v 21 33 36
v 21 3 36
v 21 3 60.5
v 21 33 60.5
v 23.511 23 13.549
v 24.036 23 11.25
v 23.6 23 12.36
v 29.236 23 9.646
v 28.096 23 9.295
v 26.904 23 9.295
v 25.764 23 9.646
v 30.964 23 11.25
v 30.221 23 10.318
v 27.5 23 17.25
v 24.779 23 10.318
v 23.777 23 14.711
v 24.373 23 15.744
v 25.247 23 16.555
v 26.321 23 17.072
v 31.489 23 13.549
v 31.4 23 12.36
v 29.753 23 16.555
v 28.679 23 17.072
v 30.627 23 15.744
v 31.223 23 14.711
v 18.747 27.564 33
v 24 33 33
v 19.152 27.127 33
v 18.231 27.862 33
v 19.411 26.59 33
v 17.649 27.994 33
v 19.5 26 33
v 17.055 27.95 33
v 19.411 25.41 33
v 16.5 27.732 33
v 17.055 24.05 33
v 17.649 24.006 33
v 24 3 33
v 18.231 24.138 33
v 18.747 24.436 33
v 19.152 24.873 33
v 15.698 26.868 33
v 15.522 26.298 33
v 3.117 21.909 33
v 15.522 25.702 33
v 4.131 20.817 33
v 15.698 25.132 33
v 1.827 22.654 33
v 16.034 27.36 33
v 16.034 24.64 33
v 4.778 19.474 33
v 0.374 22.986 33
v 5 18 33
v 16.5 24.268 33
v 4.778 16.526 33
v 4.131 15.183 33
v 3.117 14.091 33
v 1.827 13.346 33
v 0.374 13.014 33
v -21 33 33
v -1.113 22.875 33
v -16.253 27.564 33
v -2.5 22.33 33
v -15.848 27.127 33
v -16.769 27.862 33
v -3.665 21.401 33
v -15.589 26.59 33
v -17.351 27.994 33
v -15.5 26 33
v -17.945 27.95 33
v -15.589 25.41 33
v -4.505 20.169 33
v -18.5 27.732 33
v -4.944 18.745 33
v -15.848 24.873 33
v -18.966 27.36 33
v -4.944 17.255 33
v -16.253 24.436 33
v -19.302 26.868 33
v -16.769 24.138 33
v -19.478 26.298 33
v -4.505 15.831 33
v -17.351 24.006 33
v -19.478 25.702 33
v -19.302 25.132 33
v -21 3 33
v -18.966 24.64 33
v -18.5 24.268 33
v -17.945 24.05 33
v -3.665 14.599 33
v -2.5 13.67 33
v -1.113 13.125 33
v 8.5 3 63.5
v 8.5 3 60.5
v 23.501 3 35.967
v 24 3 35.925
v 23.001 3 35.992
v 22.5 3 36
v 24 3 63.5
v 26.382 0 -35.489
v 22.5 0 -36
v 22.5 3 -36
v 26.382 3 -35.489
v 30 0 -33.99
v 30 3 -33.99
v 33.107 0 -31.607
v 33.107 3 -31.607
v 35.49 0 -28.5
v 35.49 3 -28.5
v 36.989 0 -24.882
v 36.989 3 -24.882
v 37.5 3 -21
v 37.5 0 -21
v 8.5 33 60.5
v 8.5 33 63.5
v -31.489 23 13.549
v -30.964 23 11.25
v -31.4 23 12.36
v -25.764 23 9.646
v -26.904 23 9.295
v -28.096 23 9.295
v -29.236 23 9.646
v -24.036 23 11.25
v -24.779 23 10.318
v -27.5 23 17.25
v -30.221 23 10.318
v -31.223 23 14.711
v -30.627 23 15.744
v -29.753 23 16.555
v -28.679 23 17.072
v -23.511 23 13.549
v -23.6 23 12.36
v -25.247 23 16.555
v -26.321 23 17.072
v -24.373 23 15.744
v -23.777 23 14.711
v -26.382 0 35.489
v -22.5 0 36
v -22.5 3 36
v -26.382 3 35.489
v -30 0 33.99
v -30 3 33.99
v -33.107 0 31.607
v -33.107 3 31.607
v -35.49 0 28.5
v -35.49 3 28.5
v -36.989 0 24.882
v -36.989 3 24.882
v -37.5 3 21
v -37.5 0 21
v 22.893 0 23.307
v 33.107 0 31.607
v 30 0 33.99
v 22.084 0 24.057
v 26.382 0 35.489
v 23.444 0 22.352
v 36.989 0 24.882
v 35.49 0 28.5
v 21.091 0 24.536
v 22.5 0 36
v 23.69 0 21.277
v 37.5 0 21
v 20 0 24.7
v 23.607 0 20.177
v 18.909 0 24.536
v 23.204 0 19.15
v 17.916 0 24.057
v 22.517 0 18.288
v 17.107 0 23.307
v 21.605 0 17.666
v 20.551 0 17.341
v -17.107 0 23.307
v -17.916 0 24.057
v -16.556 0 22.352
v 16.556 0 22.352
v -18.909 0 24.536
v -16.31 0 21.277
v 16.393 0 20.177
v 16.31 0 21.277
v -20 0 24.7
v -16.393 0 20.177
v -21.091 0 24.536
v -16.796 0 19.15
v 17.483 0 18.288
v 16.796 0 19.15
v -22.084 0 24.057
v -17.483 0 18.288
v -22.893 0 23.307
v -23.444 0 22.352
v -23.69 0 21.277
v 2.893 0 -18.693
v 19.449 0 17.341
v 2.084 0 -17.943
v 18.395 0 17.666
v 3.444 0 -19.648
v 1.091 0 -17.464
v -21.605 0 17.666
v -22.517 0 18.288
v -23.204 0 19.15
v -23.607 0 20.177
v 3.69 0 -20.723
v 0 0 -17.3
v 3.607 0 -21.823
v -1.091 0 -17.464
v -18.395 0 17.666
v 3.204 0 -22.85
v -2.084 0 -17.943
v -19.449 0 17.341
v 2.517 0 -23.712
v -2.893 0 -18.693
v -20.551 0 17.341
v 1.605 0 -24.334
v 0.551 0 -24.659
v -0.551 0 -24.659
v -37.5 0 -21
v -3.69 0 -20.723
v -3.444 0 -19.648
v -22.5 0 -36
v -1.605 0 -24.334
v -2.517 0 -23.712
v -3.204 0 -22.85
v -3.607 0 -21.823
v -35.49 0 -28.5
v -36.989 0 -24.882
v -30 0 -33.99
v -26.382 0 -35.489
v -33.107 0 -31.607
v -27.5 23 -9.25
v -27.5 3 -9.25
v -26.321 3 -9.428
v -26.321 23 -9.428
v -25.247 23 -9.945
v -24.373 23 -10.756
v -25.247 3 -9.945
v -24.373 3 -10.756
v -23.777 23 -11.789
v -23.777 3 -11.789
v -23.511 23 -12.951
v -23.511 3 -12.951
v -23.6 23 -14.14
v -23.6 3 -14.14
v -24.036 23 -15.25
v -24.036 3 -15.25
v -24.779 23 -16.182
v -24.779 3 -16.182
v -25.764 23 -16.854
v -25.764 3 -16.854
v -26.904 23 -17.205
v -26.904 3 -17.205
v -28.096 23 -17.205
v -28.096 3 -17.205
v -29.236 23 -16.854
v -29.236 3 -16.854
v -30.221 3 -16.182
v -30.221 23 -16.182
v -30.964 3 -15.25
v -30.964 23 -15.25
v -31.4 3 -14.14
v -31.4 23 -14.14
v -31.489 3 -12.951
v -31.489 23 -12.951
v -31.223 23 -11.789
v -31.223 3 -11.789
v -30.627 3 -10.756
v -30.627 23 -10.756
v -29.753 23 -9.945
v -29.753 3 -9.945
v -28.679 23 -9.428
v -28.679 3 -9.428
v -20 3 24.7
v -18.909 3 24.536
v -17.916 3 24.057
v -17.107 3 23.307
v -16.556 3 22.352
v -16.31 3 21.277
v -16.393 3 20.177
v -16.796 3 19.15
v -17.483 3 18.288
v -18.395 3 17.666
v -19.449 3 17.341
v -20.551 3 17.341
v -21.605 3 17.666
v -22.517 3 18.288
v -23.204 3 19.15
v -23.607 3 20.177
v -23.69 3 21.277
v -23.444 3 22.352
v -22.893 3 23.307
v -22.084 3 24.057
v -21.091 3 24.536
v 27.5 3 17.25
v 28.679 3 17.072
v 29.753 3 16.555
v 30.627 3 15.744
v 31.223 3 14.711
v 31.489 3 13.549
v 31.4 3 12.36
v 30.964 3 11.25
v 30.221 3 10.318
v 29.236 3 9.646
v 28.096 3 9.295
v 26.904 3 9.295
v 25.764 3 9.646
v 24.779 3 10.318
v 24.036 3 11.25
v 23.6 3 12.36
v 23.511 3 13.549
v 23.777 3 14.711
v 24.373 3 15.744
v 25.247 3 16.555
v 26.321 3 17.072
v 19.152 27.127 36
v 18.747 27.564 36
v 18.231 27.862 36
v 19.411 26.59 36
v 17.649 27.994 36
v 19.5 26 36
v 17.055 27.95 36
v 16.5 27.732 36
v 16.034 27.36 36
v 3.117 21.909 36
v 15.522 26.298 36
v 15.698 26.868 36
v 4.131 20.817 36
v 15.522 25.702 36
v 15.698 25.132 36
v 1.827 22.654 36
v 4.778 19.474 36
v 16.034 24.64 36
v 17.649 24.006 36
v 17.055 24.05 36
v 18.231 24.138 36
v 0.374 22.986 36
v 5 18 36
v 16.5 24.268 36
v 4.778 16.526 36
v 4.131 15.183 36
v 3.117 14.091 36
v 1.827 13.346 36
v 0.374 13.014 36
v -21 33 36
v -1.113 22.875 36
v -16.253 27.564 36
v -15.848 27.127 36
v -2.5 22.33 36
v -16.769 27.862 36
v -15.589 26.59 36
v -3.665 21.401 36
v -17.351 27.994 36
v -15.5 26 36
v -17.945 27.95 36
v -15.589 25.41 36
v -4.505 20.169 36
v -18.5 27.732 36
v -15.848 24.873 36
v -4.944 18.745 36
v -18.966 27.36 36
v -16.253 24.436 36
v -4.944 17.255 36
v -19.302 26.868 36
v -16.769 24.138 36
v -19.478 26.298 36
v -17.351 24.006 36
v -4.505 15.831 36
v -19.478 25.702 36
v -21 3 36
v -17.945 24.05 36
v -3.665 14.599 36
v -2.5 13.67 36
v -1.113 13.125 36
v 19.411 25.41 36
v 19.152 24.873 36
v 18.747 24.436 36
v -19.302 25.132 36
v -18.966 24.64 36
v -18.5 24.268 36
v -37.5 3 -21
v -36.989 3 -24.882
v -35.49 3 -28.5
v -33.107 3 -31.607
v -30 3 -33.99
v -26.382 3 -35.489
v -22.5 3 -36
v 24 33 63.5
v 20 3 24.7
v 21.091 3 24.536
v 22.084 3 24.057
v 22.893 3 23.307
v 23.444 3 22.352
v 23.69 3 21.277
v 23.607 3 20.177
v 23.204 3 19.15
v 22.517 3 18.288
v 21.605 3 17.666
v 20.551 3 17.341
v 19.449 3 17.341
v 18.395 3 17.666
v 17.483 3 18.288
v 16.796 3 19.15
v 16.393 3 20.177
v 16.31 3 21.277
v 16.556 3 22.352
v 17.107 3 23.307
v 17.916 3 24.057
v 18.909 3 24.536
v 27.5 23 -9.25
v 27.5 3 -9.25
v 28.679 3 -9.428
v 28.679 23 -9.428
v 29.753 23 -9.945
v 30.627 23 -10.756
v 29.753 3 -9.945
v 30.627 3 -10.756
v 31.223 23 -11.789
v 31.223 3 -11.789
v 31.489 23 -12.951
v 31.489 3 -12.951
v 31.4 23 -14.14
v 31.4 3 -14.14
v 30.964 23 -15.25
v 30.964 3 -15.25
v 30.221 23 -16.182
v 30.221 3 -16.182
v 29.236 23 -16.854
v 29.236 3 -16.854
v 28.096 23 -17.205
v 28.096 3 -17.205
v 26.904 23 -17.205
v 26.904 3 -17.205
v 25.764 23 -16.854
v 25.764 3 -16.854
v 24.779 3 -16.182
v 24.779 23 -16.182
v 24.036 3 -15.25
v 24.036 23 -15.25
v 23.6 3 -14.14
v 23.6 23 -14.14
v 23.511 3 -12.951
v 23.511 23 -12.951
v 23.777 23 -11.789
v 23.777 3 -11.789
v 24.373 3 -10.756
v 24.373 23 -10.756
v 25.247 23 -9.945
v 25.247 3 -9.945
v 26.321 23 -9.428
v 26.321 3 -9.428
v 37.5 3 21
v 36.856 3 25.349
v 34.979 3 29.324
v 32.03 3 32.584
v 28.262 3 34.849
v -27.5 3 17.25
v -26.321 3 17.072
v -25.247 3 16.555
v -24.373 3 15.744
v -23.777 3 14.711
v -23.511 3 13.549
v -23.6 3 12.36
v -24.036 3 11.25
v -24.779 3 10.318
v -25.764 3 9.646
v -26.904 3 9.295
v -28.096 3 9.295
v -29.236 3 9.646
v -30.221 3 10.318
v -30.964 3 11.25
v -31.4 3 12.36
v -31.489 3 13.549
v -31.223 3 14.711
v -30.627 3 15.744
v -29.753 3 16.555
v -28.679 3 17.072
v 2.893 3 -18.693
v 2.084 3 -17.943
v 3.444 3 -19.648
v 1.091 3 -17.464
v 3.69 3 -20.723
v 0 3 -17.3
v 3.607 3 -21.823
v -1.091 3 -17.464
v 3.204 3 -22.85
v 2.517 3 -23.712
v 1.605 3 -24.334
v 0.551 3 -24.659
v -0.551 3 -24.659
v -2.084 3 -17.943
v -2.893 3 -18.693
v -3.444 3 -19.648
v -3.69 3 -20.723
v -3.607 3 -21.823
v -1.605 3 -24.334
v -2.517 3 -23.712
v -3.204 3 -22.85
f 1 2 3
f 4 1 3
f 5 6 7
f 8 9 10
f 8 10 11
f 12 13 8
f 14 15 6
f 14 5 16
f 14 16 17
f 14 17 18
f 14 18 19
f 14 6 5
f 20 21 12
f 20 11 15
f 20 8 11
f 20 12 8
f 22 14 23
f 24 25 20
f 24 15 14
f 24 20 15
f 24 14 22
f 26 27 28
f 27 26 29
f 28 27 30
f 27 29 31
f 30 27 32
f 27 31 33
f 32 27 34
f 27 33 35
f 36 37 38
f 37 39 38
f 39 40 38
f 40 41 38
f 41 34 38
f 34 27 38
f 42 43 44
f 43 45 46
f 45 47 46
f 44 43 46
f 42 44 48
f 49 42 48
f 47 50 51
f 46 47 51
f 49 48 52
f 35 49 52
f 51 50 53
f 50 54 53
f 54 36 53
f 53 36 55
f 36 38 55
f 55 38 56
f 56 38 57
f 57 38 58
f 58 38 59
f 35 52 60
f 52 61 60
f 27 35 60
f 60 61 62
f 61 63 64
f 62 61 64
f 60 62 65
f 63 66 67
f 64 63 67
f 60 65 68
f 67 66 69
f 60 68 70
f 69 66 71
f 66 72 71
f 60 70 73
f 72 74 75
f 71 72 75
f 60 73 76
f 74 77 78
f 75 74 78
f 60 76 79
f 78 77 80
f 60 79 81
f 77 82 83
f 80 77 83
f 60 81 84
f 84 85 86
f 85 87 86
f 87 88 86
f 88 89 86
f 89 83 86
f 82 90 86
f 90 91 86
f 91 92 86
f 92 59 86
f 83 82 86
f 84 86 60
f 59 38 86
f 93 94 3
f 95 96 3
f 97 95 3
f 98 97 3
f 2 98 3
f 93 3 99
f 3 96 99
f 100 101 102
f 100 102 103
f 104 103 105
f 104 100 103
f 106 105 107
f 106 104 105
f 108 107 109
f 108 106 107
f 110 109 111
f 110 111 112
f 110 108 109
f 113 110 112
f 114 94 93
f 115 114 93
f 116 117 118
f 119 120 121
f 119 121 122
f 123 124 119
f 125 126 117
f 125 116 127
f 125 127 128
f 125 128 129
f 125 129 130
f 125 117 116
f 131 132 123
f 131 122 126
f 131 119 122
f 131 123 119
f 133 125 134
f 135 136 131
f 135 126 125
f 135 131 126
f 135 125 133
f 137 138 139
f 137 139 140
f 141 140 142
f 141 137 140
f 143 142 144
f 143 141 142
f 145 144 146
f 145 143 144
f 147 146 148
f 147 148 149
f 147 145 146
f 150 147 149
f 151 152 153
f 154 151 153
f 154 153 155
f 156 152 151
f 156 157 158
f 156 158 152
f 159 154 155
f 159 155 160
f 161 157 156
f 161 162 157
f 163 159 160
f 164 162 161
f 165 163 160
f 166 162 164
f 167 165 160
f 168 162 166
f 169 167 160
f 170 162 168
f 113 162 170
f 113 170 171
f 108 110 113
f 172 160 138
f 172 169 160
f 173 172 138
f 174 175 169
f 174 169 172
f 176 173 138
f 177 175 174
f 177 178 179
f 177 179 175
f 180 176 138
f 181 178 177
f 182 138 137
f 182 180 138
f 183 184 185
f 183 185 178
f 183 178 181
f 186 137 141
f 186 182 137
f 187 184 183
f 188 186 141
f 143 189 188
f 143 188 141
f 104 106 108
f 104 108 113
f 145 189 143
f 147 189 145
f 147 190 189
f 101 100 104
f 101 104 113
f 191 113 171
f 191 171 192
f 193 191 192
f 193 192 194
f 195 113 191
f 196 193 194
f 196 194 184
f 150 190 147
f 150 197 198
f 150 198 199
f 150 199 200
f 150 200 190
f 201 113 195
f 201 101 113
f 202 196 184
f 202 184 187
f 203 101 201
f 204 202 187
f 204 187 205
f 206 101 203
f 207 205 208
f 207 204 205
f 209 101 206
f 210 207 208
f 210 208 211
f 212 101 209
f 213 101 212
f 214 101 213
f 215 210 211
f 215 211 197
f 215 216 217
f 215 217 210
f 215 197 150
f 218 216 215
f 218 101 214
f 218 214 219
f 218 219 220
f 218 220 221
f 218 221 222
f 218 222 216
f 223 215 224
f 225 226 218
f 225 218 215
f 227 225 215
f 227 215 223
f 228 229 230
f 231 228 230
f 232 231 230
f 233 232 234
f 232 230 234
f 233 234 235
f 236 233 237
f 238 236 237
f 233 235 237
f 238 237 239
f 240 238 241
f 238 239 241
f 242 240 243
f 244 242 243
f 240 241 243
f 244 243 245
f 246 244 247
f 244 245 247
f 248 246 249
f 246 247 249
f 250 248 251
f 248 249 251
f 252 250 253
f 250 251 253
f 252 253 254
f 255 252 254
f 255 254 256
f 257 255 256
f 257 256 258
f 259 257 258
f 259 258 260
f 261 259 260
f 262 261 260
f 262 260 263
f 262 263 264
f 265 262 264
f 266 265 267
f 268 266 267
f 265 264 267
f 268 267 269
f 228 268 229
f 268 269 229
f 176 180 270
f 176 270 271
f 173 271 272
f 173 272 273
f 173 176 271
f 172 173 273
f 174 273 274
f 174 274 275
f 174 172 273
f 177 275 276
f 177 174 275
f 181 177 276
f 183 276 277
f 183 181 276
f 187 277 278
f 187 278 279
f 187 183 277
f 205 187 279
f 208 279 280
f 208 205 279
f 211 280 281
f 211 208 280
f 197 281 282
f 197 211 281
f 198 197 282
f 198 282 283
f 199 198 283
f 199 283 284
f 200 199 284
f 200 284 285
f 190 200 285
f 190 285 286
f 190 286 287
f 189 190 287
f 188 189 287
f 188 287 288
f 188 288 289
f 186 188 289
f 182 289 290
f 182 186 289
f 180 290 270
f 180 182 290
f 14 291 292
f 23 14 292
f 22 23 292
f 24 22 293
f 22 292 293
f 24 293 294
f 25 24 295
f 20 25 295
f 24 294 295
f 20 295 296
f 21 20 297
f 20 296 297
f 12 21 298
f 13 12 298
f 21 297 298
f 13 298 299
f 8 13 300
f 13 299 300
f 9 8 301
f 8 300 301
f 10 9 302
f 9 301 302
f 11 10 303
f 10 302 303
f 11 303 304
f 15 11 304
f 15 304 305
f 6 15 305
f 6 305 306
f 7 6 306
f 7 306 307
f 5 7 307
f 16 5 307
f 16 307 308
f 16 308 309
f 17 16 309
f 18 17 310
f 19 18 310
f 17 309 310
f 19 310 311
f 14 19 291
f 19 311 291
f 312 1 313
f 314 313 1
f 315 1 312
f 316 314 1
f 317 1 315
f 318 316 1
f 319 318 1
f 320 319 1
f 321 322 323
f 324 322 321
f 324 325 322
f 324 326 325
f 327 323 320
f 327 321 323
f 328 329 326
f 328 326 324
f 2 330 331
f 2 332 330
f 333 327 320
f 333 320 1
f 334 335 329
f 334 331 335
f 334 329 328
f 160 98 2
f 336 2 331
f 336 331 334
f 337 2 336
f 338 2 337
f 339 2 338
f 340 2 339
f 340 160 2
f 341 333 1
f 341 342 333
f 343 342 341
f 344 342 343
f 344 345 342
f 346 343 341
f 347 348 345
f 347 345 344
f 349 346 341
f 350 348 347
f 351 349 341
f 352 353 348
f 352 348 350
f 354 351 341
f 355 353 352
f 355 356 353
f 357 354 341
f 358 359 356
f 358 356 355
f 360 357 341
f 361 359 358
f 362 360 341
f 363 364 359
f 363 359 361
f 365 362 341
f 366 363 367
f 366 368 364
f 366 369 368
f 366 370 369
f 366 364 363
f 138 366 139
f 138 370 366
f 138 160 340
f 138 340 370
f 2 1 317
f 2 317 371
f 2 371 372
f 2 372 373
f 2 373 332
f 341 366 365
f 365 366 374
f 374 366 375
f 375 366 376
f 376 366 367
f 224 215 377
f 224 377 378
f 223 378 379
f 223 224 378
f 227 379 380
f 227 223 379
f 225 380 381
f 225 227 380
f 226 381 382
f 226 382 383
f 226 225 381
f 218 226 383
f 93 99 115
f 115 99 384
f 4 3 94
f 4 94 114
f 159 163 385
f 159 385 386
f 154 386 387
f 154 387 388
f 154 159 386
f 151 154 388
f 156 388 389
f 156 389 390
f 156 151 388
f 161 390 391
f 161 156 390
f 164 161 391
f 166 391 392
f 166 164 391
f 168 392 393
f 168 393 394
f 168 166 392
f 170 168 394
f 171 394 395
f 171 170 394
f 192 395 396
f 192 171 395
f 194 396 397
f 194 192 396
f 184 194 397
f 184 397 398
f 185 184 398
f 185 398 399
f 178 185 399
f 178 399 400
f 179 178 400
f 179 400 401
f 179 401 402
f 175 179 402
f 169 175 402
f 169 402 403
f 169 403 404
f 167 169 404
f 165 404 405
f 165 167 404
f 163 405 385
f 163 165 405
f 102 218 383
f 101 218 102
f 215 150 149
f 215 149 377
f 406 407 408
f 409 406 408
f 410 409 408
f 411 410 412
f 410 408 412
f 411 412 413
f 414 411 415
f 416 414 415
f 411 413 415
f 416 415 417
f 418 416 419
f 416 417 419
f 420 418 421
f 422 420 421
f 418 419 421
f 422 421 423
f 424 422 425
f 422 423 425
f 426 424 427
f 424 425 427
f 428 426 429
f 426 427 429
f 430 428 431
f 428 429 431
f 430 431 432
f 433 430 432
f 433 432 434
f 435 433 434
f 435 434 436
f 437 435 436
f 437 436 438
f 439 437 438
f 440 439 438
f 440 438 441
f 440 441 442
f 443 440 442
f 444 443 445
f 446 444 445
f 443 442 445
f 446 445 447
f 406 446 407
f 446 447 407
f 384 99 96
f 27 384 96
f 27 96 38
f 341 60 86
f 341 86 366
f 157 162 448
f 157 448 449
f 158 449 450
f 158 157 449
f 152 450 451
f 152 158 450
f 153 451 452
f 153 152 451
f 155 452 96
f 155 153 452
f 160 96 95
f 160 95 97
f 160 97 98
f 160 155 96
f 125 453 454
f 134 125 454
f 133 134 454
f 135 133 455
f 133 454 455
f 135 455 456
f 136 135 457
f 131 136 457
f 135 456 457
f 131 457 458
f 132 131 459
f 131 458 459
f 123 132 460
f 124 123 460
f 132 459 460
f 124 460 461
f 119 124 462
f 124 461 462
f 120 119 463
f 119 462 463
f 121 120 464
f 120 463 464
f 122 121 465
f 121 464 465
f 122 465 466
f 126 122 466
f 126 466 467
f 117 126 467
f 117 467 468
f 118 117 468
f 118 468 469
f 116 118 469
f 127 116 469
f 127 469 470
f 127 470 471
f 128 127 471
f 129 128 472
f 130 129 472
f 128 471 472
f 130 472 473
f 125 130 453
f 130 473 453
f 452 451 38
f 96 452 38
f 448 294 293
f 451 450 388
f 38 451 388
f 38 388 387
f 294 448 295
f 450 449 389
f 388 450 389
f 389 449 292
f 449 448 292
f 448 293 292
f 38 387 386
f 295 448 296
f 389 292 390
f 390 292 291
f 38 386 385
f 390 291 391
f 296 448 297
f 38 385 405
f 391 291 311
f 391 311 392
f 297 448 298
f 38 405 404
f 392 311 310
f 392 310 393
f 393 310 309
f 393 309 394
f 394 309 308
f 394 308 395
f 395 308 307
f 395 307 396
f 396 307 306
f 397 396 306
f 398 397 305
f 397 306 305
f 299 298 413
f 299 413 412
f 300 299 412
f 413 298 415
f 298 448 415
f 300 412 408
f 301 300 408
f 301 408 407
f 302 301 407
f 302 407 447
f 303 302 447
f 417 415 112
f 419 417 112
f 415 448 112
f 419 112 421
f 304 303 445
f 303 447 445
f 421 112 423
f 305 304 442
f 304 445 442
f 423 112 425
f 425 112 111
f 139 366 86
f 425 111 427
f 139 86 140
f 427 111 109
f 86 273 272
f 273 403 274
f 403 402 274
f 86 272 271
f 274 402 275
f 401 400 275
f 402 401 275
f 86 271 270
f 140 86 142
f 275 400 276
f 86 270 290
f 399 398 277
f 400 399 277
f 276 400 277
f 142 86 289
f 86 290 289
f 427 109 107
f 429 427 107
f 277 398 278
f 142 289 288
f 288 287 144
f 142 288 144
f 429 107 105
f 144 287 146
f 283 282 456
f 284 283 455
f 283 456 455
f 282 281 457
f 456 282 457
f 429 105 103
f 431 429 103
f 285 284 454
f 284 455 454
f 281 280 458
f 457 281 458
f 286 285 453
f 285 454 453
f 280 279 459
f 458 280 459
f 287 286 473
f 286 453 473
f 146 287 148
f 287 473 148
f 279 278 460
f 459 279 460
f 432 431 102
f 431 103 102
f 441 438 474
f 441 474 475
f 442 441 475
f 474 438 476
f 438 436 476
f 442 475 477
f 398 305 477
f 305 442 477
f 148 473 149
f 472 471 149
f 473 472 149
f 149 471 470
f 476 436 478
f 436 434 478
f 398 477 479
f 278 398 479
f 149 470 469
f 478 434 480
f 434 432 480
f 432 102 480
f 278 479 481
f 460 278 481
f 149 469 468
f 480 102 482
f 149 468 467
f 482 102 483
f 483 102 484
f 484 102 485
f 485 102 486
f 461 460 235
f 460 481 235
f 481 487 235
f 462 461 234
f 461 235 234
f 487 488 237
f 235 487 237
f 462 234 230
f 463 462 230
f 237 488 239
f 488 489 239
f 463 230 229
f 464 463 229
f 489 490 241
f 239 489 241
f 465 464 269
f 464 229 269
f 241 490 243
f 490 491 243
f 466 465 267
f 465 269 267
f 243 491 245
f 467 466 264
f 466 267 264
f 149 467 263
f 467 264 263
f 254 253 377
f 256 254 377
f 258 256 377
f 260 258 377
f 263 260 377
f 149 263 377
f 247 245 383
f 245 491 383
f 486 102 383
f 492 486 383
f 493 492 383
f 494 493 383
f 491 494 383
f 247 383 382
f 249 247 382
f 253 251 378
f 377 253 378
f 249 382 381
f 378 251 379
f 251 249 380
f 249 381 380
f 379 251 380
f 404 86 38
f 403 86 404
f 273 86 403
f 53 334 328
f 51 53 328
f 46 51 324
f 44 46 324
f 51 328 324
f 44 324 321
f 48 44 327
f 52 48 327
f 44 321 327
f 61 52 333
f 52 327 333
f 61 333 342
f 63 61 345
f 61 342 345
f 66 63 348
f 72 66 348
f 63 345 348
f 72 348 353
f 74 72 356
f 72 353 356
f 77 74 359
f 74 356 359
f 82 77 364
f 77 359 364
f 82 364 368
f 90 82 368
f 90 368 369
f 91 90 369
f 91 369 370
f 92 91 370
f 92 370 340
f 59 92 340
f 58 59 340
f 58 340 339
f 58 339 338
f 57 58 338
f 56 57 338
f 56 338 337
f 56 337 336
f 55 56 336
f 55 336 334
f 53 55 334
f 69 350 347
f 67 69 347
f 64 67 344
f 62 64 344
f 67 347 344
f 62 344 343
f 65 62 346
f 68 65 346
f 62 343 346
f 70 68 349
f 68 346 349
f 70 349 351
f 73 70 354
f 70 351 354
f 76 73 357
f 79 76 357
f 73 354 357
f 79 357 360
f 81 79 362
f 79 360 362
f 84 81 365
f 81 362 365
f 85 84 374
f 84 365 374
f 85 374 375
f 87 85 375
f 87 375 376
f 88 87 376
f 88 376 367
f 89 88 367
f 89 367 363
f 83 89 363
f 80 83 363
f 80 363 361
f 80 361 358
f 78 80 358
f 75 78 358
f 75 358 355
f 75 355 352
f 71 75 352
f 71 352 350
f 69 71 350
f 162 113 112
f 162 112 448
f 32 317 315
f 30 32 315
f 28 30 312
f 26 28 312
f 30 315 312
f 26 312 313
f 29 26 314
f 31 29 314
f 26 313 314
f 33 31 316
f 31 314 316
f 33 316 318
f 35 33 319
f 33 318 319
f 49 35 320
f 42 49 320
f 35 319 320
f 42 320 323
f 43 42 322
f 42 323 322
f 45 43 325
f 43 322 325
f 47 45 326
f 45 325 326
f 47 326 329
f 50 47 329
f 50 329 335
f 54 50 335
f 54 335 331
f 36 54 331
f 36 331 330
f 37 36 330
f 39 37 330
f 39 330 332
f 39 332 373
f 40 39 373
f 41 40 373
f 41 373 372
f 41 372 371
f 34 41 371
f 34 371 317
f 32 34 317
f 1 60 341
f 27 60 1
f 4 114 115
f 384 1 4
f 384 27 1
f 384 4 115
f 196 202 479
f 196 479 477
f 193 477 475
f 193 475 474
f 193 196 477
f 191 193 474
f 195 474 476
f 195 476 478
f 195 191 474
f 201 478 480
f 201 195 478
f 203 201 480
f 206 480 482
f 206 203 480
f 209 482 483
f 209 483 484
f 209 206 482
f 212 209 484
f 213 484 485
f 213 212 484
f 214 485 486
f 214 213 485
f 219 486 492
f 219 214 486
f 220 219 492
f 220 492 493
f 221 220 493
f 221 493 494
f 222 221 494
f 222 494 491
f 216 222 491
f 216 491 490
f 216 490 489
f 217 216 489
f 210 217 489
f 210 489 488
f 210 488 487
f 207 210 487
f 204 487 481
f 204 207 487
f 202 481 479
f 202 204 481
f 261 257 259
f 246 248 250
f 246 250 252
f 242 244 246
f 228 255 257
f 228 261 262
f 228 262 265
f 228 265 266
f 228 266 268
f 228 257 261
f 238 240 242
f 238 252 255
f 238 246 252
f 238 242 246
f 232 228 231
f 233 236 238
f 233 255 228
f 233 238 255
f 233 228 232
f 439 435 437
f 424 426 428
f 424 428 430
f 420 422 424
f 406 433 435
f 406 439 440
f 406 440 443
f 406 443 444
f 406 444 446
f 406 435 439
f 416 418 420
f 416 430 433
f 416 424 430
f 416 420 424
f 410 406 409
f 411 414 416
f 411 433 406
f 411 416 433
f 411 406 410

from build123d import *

# Parameters (mm, degrees)
SKETCH1_R           = 3.7
BOSS_EXTRUDE1_DEPTH = 3
SKETCH3_R           = 4
BOSS_EXTRUDE3_DEPTH = 20
BOSS_EXTRUDE5_DEPTH = 30
CUT_EXTRUDE1_REACH  = 89.631
SKETCH6_R           = 5
SKETCH6_R_2         = 2
SKETCH8_W           = 3
SKETCH8_H           = 30
BOSS_EXTRUDE6_DEPTH = 12.5


with BuildPart() as part:
    # Sketch1 → Boss-Extrude1 (new body)
    with BuildSketch(Plane(origin=(0, 0, 0), x_dir=(1, 0, 0), z_dir=(0, 1, 0))):
        with BuildLine():
            Line((-37.5, -21), (-37.5, 21))
            ThreePointArc((-37.5, 21), (-33.106601718, 31.606601718), (-22.5, 36))
            Line((-22.5, 36), (22.5, 36))
            ThreePointArc((22.5, 36), (33.106601718, 31.606601718), (37.5, 21))
            Line((37.5, 21), (37.5, -21))
            ThreePointArc((37.5, -21), (33.106601718, -31.606601718), (22.5, -36))
            Line((22.5, -36), (-22.5, -36))
            ThreePointArc((-22.5, -36), (-33.106601718, -31.606601718), (-37.5, -21))
        make_face()
        with Locations(Location((0, 21, 0), (0, 0, 270))):
            Circle(SKETCH1_R, mode=Mode.SUBTRACT)
        with Locations(Location((-20, -21, 0), (0, 0, 270))):
            Circle(SKETCH1_R, mode=Mode.SUBTRACT)
        with Locations(Location((20, -21, 0), (0, 0, 270))):
            Circle(SKETCH1_R, mode=Mode.SUBTRACT)
    extrude(amount=BOSS_EXTRUDE1_DEPTH)

    # Sketch3 → Boss-Extrude3 (add)
    with BuildSketch(Plane(origin=(0, 3, -40.87670084), x_dir=(-1, 0, 0), z_dir=(0, 1, 0))):
        with Locations(Location((-27.5, 27.62670084, 0), (0, 0, 90))):
            Circle(SKETCH3_R)
        with Locations(Location((27.5, 54.12670084, 0), (0, 0, 90))):
            Circle(SKETCH3_R)
        with Locations(Location((-27.5, 54.12670084, 0), (0, 0, 90))):
            Circle(SKETCH3_R)
        with Locations(Location((27.5, 27.62670084, 0), (0, 0, 90))):
            Circle(SKETCH3_R)
    extrude(amount=BOSS_EXTRUDE3_DEPTH)

    # Sketch5 → Boss-Extrude5 (add)
    with BuildSketch(Plane(origin=(0, 3, 0), x_dir=(1, 0, 0), z_dir=(0, 1, 0))):
        Polygon((24, -63.5), (24, -36), (24, -33), (-21, -33), (-21, -36), (21, -36), (21, -63.5), align=None)
    extrude(amount=BOSS_EXTRUDE5_DEPTH)

    # Sketch6 → Cut-Extrude1 (cut, up to next)
    with BuildSketch(Plane.XY.offset(36), mode=Mode.PRIVATE) as cut_extrude1_sk1:
        with Locations((0, 18)):
            Circle(SKETCH6_R)
    cut_extrude1_tool1 = extrude(cut_extrude1_sk1.sketch, amount=-CUT_EXTRUDE1_REACH, mode=Mode.PRIVATE) & part.part
    # Sketch6 → Cut-Extrude1 (cut, up to next)
    with BuildSketch(Plane.XY.offset(36), mode=Mode.PRIVATE) as cut_extrude1_sk2:
        with Locations((-17.5, 26)):
            Circle(SKETCH6_R_2)
    cut_extrude1_tool2 = extrude(cut_extrude1_sk2.sketch, amount=-CUT_EXTRUDE1_REACH, mode=Mode.PRIVATE) & part.part
    # Sketch6 → Cut-Extrude1 (cut, up to next)
    with BuildSketch(Plane.XY.offset(36), mode=Mode.PRIVATE) as cut_extrude1_sk3:
        with Locations((17.5, 26)):
            Circle(SKETCH6_R_2)
    cut_extrude1_tool3 = extrude(cut_extrude1_sk3.sketch, amount=-CUT_EXTRUDE1_REACH, mode=Mode.PRIVATE) & part.part
    add(cut_extrude1_tool1.solids().sort_by_distance((0, 18, 36))[0], mode=Mode.SUBTRACT)
    add(cut_extrude1_tool2.solids().sort_by_distance((-17.5, 26, 36))[0], mode=Mode.SUBTRACT)
    add(cut_extrude1_tool3.solids().sort_by_distance((17.5, 26, 36))[0], mode=Mode.SUBTRACT)

    # Sketch8 → Boss-Extrude6 (add)
    with BuildSketch(Plane.ZY.offset(-21)):
        with Locations((62, 18)):
            Rectangle(SKETCH8_W, SKETCH8_H)
    extrude(amount=BOSS_EXTRUDE6_DEPTH)


solid = part.part
